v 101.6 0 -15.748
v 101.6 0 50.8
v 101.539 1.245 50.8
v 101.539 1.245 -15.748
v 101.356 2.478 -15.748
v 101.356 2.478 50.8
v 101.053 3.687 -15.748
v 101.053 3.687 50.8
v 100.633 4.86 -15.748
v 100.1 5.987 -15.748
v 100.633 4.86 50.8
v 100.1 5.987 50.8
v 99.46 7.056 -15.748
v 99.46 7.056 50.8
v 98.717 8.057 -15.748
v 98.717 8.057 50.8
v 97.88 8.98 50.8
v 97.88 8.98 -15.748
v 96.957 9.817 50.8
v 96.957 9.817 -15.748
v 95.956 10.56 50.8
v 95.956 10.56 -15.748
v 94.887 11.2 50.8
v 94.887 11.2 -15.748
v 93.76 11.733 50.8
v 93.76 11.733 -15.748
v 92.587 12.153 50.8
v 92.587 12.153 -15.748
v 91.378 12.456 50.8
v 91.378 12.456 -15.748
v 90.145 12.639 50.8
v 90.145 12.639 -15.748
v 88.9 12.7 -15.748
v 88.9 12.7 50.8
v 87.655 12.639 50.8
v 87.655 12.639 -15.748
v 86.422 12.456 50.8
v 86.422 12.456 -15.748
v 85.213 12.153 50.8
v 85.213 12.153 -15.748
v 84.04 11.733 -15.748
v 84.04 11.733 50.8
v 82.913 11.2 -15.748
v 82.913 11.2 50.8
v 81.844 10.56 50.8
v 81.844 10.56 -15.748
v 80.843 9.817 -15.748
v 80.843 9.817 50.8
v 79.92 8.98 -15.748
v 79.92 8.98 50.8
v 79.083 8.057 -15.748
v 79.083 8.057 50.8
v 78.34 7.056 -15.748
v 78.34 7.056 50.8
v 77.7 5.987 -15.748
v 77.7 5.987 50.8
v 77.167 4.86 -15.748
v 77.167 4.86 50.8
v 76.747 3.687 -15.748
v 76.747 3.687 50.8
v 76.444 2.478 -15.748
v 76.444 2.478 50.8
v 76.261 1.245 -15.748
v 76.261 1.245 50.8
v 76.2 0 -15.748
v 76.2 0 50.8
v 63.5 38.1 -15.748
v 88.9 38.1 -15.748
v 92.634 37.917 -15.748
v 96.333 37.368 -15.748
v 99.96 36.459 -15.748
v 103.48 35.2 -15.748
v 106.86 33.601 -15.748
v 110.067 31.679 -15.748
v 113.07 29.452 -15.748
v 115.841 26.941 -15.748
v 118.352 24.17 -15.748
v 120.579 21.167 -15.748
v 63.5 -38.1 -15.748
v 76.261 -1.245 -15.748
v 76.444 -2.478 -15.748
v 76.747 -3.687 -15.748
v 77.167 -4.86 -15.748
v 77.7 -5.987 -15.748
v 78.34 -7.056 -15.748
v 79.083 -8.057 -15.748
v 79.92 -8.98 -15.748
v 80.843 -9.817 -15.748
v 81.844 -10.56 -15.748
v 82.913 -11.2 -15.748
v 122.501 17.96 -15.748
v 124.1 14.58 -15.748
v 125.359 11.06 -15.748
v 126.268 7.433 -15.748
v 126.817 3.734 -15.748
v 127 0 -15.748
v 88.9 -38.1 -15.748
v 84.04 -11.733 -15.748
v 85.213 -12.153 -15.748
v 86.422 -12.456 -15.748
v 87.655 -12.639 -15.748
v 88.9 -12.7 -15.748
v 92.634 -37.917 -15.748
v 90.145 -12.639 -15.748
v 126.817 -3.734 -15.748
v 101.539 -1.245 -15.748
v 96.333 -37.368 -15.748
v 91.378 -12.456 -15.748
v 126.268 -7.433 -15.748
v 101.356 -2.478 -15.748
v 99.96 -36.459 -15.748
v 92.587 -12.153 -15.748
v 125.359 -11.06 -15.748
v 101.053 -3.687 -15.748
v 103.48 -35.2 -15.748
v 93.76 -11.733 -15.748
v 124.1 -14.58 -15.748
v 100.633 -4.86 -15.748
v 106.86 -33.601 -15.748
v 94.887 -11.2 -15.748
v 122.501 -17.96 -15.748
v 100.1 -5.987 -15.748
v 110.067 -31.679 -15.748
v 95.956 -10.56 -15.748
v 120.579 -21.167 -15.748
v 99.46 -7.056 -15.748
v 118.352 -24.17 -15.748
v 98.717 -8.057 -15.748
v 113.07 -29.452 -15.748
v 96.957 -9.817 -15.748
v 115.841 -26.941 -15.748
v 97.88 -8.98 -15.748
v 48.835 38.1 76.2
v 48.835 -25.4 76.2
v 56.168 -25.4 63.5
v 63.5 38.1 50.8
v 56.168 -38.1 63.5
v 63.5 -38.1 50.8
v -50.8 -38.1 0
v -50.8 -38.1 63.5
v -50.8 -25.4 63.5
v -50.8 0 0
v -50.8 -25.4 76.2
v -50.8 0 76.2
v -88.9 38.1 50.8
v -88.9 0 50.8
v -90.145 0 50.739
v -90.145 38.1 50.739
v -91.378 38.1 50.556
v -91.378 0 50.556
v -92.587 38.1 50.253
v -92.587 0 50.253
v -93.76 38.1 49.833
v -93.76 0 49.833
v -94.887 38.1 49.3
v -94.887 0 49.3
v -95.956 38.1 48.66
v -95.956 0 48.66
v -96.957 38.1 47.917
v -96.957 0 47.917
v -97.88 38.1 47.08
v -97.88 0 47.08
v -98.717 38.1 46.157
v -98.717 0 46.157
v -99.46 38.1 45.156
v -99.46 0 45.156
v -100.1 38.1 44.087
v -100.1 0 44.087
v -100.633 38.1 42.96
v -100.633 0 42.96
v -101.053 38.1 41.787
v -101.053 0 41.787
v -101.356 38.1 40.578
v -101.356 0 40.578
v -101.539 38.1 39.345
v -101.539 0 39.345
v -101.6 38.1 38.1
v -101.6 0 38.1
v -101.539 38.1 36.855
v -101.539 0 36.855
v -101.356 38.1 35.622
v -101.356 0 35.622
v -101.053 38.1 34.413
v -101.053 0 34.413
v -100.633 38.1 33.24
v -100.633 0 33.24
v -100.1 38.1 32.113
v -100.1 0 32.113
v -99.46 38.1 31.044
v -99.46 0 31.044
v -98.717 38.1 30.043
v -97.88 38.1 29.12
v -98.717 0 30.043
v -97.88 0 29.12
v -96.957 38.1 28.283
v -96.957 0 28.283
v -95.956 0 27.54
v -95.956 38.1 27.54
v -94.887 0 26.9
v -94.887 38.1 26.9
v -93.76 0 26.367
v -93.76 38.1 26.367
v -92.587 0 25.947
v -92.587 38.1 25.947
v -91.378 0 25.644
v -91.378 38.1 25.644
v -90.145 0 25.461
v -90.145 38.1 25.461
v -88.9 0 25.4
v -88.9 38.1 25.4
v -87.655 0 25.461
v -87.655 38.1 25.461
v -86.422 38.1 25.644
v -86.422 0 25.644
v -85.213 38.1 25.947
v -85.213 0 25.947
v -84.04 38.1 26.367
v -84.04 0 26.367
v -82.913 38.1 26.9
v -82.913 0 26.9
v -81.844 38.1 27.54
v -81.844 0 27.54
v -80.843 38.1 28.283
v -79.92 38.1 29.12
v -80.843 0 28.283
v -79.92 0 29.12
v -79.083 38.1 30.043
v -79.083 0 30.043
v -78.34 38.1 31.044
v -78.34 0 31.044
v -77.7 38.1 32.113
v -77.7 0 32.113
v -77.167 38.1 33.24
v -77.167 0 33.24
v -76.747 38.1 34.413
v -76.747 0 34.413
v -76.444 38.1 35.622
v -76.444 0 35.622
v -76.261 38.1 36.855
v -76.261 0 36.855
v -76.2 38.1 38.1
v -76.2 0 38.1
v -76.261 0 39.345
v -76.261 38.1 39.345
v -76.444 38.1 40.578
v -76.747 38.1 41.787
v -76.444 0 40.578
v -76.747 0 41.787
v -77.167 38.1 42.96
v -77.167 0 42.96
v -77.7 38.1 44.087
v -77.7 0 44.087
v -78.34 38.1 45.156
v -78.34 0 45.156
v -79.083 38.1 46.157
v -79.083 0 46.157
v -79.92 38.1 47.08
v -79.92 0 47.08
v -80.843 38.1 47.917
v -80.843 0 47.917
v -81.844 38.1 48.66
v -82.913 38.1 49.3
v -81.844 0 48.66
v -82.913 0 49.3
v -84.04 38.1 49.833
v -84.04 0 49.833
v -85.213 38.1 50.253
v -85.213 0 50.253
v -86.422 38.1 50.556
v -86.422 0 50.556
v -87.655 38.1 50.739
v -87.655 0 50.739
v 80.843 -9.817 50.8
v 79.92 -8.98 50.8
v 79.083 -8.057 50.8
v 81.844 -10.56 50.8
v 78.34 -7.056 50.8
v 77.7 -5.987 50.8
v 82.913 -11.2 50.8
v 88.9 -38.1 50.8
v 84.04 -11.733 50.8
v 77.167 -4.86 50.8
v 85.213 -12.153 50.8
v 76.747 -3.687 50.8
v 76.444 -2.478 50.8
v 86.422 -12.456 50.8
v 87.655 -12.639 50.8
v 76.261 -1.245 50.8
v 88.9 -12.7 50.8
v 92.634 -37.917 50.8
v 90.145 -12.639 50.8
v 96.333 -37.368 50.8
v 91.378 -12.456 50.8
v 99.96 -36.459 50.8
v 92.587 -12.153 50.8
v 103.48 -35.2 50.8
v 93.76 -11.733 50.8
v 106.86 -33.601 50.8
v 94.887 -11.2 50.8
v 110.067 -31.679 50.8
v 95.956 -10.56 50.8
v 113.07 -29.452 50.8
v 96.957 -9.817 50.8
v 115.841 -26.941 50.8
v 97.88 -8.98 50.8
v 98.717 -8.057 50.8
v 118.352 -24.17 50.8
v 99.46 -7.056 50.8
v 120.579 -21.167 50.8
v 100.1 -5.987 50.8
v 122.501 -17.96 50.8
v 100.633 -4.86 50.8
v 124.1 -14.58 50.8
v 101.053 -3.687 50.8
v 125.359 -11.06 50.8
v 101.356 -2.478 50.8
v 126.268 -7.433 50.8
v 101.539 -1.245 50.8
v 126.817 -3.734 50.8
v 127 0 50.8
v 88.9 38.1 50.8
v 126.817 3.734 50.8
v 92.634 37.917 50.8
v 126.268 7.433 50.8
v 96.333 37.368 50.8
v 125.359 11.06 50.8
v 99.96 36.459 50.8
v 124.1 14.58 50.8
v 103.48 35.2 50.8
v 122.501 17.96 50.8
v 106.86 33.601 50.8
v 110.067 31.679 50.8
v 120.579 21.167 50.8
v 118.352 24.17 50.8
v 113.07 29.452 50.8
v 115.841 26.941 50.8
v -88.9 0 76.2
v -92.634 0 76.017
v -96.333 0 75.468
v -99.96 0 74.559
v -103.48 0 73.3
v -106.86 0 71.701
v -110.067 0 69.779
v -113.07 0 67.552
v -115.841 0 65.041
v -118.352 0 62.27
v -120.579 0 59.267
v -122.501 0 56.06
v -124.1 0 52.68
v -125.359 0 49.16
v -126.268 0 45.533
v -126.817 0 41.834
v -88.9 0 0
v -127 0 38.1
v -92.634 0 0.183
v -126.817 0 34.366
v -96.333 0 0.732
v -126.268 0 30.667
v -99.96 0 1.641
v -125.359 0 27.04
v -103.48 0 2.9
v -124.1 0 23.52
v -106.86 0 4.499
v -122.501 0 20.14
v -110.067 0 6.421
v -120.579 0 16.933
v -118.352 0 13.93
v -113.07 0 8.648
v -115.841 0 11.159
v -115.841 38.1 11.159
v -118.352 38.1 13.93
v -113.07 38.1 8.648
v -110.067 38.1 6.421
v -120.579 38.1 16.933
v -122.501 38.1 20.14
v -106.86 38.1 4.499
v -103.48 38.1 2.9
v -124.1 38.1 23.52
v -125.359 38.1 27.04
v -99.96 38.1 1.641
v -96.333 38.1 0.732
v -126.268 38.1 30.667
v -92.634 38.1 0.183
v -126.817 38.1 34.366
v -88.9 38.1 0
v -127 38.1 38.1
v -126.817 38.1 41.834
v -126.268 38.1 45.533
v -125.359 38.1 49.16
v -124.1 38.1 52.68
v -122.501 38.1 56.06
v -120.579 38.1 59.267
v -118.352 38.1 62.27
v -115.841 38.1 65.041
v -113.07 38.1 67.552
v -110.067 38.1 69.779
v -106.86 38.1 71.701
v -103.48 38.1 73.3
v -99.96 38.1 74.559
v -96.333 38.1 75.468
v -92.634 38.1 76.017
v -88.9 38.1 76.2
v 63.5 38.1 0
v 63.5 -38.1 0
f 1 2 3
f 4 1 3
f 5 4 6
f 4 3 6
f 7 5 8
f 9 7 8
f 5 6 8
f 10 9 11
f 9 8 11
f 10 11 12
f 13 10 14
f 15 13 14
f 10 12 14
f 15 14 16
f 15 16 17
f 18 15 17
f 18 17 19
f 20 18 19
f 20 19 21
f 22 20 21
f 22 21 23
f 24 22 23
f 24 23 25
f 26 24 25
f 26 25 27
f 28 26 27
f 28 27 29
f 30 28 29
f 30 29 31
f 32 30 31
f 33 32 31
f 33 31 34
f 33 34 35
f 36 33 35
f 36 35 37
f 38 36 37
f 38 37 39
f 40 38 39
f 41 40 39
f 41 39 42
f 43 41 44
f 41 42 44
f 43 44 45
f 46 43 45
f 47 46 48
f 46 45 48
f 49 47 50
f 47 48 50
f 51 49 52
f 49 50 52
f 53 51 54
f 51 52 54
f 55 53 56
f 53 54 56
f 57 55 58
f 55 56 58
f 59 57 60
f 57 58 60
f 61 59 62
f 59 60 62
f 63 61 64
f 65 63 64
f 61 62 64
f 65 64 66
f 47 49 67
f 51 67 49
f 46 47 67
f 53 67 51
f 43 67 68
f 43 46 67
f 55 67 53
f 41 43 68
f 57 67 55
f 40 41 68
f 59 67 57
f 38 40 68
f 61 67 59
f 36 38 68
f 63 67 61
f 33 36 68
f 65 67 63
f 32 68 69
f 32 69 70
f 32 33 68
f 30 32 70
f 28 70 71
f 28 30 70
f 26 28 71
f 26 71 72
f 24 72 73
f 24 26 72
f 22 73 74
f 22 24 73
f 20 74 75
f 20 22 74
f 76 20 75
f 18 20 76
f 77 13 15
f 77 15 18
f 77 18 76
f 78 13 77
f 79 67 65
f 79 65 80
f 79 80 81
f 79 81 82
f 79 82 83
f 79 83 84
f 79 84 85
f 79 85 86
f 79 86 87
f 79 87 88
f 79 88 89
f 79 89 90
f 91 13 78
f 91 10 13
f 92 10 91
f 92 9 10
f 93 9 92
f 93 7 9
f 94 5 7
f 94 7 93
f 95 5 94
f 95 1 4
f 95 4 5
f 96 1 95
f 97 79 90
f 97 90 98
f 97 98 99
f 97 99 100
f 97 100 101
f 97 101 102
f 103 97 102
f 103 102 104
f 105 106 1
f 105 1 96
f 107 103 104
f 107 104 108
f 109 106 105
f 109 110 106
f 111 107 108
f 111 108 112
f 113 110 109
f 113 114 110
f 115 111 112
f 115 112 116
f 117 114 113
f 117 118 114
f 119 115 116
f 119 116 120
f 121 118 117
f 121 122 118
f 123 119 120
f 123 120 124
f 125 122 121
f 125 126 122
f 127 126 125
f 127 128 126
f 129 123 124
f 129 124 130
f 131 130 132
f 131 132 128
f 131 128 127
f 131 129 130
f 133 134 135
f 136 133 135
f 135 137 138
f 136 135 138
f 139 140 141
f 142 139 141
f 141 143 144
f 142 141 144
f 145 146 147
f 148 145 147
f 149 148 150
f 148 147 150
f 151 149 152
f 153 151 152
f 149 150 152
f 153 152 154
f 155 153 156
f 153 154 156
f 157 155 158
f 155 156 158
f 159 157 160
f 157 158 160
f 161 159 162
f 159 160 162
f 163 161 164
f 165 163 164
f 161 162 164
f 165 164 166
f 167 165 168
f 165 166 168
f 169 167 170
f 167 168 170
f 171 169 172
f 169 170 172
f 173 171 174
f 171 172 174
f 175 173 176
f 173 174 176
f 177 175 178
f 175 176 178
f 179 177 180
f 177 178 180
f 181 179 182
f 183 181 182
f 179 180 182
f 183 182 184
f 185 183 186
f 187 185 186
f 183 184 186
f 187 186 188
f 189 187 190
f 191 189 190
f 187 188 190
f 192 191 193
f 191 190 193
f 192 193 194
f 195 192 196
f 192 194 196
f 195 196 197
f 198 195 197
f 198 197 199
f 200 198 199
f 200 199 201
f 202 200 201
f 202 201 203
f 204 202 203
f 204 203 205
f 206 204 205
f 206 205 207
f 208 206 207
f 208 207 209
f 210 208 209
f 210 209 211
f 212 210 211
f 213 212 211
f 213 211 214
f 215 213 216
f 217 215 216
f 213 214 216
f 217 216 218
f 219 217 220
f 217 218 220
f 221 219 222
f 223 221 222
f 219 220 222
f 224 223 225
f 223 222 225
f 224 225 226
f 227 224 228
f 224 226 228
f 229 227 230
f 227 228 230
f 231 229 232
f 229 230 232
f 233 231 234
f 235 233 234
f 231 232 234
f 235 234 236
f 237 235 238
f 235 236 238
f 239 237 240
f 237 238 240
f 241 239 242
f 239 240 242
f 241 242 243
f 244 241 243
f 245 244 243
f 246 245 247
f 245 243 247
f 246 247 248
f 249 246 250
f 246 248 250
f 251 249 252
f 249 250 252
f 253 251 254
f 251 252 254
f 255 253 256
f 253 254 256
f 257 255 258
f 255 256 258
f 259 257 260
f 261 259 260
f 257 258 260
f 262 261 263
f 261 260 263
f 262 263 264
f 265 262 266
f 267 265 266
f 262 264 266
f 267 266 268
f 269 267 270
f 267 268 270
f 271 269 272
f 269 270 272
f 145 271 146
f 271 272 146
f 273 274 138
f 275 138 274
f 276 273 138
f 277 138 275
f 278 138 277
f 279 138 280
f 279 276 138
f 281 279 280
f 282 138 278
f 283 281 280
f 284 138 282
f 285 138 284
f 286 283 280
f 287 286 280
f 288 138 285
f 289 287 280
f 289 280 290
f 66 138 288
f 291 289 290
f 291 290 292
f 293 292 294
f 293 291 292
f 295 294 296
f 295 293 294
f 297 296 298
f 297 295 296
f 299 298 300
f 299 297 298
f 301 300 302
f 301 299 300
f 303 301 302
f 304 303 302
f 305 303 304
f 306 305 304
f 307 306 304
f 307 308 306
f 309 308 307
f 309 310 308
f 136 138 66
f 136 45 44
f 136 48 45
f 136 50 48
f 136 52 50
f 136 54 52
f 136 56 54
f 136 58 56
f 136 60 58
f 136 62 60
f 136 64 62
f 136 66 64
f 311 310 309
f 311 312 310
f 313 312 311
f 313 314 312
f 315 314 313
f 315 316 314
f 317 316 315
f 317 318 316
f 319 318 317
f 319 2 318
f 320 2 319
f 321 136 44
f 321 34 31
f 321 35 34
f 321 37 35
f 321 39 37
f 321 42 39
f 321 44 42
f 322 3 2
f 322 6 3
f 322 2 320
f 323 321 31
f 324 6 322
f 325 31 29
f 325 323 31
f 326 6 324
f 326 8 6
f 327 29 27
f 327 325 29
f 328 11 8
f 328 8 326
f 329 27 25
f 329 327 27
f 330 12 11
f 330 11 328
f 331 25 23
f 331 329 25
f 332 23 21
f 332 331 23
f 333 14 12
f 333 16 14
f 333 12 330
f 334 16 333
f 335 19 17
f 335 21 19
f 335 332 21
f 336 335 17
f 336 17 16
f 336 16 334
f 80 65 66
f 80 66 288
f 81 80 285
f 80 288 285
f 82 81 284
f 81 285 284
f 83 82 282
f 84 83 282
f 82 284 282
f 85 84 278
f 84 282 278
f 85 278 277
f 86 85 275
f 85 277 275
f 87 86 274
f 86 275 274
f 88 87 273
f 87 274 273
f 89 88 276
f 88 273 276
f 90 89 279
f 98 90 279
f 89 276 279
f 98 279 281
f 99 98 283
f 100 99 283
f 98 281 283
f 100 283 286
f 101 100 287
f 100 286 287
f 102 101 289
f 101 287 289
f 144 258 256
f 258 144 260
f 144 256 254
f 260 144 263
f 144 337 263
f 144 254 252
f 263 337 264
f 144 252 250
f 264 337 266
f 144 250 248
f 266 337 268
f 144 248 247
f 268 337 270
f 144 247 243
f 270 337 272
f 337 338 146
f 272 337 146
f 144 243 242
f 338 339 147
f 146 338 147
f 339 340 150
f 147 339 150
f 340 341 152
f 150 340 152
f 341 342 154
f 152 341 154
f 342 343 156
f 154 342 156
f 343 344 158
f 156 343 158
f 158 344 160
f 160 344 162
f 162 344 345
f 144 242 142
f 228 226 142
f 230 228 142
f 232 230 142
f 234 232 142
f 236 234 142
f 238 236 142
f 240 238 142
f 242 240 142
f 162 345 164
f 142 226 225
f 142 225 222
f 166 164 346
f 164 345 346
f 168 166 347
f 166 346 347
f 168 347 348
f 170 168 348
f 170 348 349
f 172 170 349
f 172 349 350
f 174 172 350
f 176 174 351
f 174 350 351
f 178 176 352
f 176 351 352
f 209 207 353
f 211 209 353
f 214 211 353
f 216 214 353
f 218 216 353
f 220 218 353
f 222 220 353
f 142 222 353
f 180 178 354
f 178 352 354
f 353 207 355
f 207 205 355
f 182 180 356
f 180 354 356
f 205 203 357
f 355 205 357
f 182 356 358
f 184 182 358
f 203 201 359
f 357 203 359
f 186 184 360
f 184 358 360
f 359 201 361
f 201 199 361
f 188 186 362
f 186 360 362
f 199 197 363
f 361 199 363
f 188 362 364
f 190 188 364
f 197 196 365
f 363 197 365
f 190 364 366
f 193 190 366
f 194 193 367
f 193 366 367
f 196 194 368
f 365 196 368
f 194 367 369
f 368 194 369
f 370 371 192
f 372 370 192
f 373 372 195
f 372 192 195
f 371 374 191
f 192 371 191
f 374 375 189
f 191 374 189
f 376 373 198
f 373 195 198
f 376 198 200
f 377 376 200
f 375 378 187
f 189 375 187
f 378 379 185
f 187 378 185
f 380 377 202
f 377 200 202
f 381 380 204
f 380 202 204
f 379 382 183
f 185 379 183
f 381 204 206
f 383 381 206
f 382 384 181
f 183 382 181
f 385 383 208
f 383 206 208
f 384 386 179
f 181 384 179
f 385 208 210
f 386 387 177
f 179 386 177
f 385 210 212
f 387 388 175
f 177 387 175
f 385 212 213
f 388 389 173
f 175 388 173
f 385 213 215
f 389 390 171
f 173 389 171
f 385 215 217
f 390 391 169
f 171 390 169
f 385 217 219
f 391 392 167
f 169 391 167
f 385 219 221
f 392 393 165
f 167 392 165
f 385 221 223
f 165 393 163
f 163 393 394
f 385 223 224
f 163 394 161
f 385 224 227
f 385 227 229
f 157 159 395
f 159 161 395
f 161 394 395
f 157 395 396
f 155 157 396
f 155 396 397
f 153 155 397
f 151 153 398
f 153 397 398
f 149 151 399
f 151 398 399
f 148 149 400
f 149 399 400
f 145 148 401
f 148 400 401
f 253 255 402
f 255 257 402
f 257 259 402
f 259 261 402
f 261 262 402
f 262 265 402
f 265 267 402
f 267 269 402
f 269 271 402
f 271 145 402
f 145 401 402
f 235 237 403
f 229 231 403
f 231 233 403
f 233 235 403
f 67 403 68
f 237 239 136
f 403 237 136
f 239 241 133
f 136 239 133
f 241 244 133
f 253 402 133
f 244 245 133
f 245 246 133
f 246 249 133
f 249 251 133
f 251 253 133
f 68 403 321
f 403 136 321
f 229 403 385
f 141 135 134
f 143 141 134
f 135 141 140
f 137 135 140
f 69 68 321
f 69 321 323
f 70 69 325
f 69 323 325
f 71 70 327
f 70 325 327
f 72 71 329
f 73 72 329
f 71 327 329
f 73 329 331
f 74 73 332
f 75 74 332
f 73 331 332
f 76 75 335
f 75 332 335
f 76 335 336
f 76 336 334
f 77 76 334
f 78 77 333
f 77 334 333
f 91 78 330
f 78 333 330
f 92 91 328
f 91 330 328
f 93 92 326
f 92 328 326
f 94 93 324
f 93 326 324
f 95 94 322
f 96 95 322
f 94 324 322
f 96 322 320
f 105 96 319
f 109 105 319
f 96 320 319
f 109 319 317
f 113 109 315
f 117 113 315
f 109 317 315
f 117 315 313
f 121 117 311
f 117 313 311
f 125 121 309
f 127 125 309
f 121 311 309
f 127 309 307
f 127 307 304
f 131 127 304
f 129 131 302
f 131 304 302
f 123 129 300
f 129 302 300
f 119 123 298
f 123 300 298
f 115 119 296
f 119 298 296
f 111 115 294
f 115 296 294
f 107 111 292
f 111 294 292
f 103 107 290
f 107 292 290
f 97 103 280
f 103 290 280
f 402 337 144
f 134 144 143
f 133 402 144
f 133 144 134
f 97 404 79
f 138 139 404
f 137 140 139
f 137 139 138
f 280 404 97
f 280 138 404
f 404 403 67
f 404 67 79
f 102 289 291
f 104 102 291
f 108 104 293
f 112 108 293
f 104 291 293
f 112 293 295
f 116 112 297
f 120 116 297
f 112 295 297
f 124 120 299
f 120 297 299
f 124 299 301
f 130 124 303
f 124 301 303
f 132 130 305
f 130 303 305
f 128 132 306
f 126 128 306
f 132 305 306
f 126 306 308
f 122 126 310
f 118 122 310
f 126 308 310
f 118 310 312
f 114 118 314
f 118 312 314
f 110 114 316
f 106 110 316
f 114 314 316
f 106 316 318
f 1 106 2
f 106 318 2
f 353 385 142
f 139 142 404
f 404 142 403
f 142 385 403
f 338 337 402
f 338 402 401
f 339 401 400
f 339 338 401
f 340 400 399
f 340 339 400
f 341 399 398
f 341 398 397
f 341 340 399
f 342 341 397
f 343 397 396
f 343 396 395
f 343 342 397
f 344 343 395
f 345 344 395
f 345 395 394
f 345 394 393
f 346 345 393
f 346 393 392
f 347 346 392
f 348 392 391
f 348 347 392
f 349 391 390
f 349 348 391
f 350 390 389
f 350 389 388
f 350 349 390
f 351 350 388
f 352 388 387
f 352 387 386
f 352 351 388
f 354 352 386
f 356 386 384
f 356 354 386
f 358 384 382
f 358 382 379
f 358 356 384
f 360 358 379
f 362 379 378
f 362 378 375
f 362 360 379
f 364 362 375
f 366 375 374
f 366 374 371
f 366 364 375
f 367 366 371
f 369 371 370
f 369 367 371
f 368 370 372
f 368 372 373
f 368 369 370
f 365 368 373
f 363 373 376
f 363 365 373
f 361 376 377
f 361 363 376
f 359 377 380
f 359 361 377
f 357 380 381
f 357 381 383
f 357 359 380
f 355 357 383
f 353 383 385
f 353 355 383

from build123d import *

# Parameters (mm, degrees)
F0_W      = 177.8
F0_H      = 76.2
F1_DEPTH  = 76.2
F2_W      = 38.1
F2_H      = 38.1
F3_DEPTH  = 76.2
F4_W      = 25.4
F4_H      = 76.2
F5_DEPTH  = 25.4
F6_W      = 25.4
F6_H      = 76.2
F7_DEPTH  = 15.748
F8_W      = 38.1
F8_H      = 38.1
F10_W     = 38.1
F10_H     = 66.548
F13_DEPTH = 76.2
F15_DEPTH = 101.6
F17_DEPTH = 15.748
F19_DEPTH = 38.1
F20_W     = 12.7
F20_H     = 12.7
F21_DEPTH = 127


with BuildPart() as f1:
    # F0 (on Top) → F1 (new body)
    with BuildSketch(Plane.XY):
        Rectangle(F0_W, F0_H)
    extrude(amount=F1_DEPTH)

    # F2 (on face) → F3 (cut)
    with BuildSketch(Plane.XY.offset(76.2)):
        with Locations((-69.85, -19.05)):
            Rectangle(F2_W, F2_H)
    extrude(amount=-F3_DEPTH, mode=Mode.SUBTRACT)

    # F4 (on face) → F5 (cut)
    with BuildSketch(Plane.XY.offset(76.2)):
        with Locations((76.2, 0)):
            Rectangle(F4_W, F4_H)
    extrude(amount=-F5_DEPTH, mode=Mode.SUBTRACT)

    # F6 (on face) → F7 (join)
    with BuildSketch(Plane(origin=(0, 0, 0), x_dir=(1, 0, 0), z_dir=(0, 0, -1))):
        with Locations((76.2, 0)):
            Rectangle(F6_W, F6_H)
    extrude(amount=F7_DEPTH)

    # F8 (on face) → F9 (revolve)
    with BuildSketch(Plane(origin=(-88.9, 0, 0), x_dir=(0, -1, 0), z_dir=(-1, 0, 0))):
        with Locations((-19.05, 57.15)):
            Rectangle(F8_W, F8_H)
    revolve(axis=Axis((-88.9, 19.05, 38.1), (0, -1, 0)))

    # F10 (on face) → F11 (revolve)
    with BuildSketch(Plane.YZ.offset(88.9)):
        with Locations((19.05, 17.526)):
            Rectangle(F10_W, F10_H)
    revolve(axis=Axis((88.9, 0, 17.526), (0, 0, -1)))

    # F12 (on face) → F13 (cut)
    with BuildSketch(Plane.XZ.offset(38.1)):
        Polygon((48.835303, 76.2), (63.5, 50.8), (63.5, 76.2), align=None)
    extrude(amount=-F13_DEPTH, mode=Mode.SUBTRACT)

    # F14 (on face) → F15 (cut)
    with BuildSketch(Plane.XY.offset(50.8)):
        with BuildLine():
            ThreePointArc((76.2, 0), (79.919744, -8.980256), (88.9, -12.7))
            Line((88.9, -12.7), (88.9, 0))
            Line((88.9, 0), (76.2, 0))
        make_face()
        with BuildLine():
            Line((88.9, 0), (88.9, -12.7))
            ThreePointArc((88.9, -12.7), (97.880256, -8.980256), (101.6, 0))
            ThreePointArc((101.6, 0), (88.9, 12.7), (76.2, 0))
            Line((76.2, 0), (88.9, 0))
        make_face()
    extrude(amount=-F15_DEPTH, mode=Mode.SUBTRACT)

    # F16 (on face) → F17 (cut)
    with BuildSketch(Plane(origin=(0, 0, -15.748), x_dir=(1, 0, 0), z_dir=(0, 0, -1))):
        with BuildLine():
            Line((63.5, -28.398063), (63.5, 28.398063))
            ThreePointArc((63.5, 28.398063), (50.8, 0), (63.5, -28.398063))
        make_face()
    extrude(amount=-F17_DEPTH, mode=Mode.SUBTRACT)

    # F18 (on face) → F19 (cut)
    with BuildSketch(Plane.XZ):
        with BuildLine():
            ThreePointArc((-76.2, 38.1), (-79.919744, 47.080256), (-88.9, 50.8))
            Line((-88.9, 50.8), (-88.9, 38.1))
            Line((-88.9, 38.1), (-76.2, 38.1))
        make_face()
        with BuildLine():
            Line((-88.9, 38.1), (-88.9, 50.8))
            ThreePointArc((-88.9, 50.8), (-97.880256, 29.119744), (-76.2, 38.1))
            Line((-76.2, 38.1), (-88.9, 38.1))
        make_face()
    extrude(amount=-F19_DEPTH, mode=Mode.SUBTRACT)

    # F20 (on face) → F21 (cut)
    with BuildSketch(Plane(origin=(-50.8, 0, 0), x_dir=(0, -1, 0), z_dir=(-1, 0, 0))):
        with Locations((31.75, 69.85)):
            Rectangle(F20_W, F20_H)
    extrude(amount=-F21_DEPTH, mode=Mode.SUBTRACT)


solid = f1.part
